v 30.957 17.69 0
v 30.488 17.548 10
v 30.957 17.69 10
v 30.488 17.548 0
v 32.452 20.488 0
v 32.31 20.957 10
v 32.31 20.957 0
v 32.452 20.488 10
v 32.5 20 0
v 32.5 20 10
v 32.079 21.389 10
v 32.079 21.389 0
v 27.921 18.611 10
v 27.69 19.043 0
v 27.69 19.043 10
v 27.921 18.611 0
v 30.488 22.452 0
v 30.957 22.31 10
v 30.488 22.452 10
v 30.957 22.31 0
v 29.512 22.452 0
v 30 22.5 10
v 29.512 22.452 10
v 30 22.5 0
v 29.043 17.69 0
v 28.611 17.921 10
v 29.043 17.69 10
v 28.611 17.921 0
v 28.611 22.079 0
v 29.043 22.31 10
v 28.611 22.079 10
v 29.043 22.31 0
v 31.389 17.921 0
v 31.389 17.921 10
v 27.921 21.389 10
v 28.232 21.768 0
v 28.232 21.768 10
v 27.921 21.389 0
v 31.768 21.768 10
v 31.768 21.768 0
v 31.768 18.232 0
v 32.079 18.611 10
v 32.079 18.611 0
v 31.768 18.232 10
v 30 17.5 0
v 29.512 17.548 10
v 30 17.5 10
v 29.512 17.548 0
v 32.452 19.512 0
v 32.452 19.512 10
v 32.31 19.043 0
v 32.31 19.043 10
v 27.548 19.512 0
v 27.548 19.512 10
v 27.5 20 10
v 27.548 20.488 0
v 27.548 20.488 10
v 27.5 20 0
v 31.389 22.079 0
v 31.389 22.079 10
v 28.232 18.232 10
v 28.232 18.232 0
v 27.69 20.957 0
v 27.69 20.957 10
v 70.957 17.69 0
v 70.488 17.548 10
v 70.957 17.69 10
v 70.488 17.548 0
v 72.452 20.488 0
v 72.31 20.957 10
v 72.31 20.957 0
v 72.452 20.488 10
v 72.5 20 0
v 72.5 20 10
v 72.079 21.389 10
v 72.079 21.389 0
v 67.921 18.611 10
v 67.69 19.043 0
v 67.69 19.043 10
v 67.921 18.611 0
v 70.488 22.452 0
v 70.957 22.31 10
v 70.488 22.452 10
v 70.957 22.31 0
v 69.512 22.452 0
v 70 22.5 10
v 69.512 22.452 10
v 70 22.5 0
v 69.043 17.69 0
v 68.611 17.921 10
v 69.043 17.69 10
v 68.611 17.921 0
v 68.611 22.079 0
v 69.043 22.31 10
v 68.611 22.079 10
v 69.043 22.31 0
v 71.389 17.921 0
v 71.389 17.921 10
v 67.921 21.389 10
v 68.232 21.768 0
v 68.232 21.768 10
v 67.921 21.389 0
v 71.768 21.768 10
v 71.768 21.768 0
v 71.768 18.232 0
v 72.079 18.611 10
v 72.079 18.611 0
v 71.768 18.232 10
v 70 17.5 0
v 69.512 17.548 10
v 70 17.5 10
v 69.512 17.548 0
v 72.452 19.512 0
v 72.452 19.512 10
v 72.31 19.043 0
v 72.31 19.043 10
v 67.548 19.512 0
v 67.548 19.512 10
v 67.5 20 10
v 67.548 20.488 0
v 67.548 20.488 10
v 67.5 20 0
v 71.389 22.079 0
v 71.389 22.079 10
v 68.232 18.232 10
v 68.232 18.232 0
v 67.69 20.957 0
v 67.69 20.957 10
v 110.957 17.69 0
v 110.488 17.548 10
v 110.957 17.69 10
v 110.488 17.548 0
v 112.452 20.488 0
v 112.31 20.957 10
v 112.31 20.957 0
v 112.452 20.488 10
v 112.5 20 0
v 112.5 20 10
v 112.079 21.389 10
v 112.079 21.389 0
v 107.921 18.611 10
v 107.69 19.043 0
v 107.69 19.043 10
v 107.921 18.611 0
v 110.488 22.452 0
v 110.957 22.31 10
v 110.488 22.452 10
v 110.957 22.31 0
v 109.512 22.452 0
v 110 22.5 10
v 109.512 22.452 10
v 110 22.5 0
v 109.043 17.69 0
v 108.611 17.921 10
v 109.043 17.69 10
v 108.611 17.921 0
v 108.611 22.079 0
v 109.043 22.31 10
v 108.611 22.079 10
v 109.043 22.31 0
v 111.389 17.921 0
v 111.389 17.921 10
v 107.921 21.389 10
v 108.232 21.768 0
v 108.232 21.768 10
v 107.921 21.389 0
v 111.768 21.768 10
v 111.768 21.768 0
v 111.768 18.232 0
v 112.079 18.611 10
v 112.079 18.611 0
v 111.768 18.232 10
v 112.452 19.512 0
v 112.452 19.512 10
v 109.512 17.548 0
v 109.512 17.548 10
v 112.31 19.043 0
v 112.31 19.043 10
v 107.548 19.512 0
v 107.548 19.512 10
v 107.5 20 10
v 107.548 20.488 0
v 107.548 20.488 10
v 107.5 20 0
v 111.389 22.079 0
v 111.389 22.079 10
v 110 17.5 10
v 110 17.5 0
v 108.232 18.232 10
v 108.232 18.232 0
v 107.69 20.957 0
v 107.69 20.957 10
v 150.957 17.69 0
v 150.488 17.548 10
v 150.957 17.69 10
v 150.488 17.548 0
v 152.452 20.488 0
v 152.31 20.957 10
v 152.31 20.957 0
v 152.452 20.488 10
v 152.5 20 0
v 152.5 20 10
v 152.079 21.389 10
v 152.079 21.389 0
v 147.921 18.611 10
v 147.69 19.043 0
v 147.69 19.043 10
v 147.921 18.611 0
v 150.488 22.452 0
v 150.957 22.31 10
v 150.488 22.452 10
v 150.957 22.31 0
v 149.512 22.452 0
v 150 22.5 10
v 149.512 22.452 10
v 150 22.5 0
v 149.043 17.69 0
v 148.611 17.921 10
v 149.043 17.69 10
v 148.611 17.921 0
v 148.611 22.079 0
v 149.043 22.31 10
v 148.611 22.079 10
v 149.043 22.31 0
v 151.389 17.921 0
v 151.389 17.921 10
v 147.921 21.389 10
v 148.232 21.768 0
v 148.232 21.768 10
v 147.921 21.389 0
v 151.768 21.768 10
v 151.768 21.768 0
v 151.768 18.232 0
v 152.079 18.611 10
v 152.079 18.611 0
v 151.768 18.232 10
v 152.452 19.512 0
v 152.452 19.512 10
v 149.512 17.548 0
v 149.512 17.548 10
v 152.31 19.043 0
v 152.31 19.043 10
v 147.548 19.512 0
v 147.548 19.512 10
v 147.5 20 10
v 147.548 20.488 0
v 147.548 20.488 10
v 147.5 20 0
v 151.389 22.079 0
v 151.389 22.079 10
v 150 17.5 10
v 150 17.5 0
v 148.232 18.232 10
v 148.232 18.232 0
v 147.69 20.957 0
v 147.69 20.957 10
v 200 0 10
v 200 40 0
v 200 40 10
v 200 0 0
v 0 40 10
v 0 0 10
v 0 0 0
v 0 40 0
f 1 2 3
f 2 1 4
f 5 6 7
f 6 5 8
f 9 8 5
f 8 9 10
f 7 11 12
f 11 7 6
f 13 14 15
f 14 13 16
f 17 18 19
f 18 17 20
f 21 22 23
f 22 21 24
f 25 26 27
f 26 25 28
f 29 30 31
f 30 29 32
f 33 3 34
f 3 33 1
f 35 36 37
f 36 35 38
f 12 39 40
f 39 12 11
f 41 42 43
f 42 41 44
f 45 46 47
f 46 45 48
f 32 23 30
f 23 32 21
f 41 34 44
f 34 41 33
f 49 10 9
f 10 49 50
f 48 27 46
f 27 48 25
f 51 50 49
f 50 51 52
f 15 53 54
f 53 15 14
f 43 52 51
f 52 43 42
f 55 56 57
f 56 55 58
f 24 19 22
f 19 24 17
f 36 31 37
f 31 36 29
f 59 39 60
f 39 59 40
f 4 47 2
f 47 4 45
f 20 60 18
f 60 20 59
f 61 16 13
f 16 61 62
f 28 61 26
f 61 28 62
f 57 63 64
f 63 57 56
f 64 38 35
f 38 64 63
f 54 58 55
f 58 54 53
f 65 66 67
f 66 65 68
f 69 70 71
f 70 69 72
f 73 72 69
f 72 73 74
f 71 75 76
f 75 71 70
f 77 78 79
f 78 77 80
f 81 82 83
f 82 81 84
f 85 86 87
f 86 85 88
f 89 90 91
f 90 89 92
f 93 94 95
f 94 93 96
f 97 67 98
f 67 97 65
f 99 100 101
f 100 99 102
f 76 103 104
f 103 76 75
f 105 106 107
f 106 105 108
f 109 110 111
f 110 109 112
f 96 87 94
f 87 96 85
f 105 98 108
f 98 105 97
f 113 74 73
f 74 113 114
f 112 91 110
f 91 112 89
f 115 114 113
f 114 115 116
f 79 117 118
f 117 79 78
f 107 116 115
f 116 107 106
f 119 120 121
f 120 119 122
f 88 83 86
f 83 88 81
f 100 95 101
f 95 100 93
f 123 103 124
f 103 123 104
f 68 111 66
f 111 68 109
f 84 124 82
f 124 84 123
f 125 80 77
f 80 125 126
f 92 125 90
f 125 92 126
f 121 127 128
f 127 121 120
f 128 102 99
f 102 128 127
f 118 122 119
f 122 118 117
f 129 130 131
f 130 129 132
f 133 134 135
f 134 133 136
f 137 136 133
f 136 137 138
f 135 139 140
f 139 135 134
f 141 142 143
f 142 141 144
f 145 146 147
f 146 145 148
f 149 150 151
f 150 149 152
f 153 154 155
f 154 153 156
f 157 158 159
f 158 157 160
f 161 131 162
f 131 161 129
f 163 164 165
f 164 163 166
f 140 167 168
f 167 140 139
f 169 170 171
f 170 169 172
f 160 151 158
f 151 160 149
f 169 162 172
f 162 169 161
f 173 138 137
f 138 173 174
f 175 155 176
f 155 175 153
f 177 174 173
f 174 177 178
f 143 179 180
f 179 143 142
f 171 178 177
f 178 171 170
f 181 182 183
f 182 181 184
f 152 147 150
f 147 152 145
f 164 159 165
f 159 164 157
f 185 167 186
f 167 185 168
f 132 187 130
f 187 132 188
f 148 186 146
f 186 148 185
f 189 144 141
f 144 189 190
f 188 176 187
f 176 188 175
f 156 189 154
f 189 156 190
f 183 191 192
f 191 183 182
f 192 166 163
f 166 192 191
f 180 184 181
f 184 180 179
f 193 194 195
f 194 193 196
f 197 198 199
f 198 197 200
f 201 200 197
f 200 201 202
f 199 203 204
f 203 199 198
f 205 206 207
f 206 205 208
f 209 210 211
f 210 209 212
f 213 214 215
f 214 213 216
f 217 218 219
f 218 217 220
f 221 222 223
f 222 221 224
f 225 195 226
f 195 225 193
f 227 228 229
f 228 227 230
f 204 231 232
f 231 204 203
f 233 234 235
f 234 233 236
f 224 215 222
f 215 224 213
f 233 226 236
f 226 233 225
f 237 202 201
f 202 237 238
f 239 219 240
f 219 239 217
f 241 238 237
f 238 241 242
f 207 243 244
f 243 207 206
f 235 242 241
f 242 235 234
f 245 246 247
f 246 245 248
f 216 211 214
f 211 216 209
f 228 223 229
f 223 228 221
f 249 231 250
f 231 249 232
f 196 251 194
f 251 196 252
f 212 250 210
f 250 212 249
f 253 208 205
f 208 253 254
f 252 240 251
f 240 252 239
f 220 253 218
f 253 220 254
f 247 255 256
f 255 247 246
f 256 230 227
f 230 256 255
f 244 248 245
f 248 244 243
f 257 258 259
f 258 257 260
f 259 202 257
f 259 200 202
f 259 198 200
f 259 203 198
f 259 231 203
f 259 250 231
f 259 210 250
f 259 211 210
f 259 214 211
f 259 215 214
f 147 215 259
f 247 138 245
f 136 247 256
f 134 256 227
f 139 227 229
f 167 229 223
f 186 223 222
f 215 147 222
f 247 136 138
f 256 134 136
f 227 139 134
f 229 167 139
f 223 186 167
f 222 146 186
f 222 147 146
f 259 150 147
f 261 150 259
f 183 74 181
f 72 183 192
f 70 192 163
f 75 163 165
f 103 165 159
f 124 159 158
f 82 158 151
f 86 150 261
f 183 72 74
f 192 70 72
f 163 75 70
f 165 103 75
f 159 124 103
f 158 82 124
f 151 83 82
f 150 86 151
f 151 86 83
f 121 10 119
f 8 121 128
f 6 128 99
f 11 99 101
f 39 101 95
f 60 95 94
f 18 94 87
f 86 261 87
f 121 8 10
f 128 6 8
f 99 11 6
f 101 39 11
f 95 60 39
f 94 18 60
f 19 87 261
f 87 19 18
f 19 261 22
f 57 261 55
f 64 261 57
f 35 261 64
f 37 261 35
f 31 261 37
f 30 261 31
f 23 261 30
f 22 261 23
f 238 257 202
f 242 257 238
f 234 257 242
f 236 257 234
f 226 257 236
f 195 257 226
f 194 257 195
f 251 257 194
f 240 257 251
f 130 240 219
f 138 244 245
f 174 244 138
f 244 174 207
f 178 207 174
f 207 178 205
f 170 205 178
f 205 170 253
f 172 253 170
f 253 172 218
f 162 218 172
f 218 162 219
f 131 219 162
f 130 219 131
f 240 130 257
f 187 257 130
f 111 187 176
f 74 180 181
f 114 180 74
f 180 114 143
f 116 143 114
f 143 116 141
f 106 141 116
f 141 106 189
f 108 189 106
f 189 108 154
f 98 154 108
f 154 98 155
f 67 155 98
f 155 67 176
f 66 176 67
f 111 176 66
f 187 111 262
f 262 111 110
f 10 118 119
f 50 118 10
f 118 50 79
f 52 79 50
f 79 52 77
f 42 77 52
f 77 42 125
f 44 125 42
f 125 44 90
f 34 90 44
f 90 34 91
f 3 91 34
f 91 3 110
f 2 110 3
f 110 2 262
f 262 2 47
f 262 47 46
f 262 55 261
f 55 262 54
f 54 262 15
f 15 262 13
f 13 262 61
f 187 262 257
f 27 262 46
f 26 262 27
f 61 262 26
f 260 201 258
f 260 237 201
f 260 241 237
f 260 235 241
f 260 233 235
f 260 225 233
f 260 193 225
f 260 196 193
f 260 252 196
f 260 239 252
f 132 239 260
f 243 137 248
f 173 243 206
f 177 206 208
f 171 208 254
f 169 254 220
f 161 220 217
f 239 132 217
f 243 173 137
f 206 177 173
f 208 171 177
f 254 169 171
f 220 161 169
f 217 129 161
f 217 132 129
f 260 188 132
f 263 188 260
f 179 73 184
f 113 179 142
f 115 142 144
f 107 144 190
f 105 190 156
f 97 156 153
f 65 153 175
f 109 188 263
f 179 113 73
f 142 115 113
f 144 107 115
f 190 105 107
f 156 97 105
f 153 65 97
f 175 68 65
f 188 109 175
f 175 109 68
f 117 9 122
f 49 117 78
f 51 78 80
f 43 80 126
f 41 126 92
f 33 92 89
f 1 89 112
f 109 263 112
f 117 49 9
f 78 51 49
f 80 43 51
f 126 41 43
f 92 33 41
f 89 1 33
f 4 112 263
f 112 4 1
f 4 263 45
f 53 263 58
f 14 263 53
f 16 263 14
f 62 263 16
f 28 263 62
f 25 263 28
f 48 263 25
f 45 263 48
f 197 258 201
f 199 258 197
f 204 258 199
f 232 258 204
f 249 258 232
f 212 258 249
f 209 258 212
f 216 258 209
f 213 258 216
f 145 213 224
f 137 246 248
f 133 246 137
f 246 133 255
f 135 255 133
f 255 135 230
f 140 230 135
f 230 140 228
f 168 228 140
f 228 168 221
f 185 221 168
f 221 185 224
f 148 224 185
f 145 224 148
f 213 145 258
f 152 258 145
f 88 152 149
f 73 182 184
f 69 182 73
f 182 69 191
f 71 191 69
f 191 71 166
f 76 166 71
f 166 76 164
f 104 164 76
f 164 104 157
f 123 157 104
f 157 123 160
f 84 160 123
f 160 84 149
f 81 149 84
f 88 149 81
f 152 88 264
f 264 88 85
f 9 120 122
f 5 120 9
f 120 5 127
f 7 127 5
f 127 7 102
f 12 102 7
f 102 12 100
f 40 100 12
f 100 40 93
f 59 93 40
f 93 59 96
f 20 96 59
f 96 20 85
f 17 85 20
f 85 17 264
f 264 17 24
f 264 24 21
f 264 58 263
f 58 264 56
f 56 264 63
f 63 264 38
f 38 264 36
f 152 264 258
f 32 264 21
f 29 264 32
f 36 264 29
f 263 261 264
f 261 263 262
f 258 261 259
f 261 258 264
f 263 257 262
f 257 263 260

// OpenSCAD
$fn = 32;

// ----------------------------------------------------------------------
// Long rail: 200-250 mm mounting rail
// ----------------------------------------------------------------------

// --- parameters (mm) ---
rail_l = 200;             // rail length, X
rail_w = 40;              // rail width, Y
rail_t = 10;              // rail thickness, Z
hole_d = 5;               // mounting hole diameter
hole_start = 30;          // first hole offset from the end
hole_pitch = 40;          // hole pitch
holes = 4;                // number of holes

difference() {
  cube([rail_l, rail_w, rail_t]);
  for (i = [0 : holes - 1])
    translate([hole_start + i * hole_pitch, rail_w / 2, -1])
      cylinder(h = rail_t + 2, d = hole_d);
}
